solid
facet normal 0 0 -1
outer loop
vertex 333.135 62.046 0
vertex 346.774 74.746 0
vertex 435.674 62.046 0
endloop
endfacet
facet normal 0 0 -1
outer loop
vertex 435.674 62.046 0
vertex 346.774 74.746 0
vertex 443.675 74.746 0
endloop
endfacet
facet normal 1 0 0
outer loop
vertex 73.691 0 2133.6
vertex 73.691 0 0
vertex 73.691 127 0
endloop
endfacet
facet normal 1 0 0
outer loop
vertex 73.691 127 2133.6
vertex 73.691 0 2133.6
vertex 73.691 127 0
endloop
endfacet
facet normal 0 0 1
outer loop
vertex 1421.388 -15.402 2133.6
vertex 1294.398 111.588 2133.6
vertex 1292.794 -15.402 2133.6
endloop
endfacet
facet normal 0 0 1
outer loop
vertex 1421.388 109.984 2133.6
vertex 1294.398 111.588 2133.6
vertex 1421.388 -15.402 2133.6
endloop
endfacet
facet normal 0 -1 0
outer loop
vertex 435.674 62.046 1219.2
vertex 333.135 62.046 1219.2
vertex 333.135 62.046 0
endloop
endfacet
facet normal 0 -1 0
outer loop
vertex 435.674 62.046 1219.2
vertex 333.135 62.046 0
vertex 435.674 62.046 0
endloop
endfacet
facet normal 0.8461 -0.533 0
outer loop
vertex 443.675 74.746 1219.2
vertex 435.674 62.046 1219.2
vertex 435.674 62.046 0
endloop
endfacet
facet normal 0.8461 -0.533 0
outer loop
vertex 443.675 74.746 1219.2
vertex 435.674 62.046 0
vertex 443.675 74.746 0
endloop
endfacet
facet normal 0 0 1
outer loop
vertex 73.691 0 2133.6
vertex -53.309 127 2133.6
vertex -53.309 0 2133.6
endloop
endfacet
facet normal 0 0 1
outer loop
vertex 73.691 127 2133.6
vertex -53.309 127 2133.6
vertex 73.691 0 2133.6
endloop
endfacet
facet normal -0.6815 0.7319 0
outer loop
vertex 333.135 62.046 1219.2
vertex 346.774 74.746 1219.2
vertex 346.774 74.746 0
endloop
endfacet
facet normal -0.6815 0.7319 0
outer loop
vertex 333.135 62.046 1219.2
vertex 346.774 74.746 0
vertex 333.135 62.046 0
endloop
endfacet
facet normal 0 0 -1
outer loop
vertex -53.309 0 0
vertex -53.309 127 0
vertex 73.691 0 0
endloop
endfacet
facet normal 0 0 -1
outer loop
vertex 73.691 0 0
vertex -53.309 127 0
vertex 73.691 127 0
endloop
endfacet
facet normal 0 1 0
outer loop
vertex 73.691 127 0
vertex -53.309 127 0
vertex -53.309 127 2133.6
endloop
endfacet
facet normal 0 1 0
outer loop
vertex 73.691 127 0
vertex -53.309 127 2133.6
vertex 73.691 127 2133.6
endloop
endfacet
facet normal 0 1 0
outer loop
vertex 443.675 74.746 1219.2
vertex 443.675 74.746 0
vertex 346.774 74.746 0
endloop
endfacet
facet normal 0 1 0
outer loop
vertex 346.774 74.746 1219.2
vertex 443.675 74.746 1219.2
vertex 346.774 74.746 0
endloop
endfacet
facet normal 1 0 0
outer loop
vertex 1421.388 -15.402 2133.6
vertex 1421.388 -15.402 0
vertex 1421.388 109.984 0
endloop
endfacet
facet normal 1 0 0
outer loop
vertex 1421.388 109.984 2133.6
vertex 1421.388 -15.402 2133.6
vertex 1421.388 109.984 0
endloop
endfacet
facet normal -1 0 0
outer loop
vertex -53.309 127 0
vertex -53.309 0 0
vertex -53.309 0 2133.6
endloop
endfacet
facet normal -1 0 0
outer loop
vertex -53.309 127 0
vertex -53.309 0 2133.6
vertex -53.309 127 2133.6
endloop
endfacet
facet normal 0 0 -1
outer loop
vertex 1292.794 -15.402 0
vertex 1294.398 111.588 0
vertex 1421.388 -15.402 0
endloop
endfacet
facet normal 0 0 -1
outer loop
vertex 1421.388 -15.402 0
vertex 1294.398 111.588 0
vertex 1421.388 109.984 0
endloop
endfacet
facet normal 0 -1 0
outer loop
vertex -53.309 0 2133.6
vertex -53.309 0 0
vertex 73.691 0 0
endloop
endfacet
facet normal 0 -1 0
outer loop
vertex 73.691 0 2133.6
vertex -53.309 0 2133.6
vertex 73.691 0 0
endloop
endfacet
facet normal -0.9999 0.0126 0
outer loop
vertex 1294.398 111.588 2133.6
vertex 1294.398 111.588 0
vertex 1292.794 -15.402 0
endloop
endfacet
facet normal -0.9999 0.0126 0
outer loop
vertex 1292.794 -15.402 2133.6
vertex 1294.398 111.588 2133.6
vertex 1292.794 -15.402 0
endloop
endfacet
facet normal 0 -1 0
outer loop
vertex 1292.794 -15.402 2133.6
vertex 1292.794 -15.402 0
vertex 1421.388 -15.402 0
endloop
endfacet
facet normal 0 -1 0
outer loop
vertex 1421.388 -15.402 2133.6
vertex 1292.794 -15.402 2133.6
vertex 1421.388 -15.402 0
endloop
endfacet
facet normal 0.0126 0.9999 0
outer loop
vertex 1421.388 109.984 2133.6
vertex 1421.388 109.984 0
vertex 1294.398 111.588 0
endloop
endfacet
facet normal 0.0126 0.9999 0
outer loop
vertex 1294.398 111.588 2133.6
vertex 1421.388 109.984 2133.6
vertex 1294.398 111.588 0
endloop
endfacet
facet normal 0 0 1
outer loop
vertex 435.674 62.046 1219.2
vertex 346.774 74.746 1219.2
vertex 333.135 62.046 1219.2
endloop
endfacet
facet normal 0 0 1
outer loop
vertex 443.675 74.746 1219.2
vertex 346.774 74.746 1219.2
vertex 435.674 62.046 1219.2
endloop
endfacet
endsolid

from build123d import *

# Parameters (mm, degrees)
F0_W     = 127
F0_H     = 127
F1_DEPTH = 2133.6
F3_DEPTH = 1219.2


with BuildPart() as f1:
    # F0 (on Top) → F1 (new body)
    with BuildSketch(Plane.XY):
        with Locations((10.191282, 63.5)):
            Rectangle(F0_W, F0_H)
        Polygon((1294.398367, 111.587874), (1292.793993, -15.401991), (1421.388232, -15.401991), (1421.388232, 109.9835), align=None)
    extrude(amount=F1_DEPTH)


with BuildPart() as f3:
    # F2 (on Top) → F3 (new body)
    with BuildSketch(Plane.XY):
        Polygon((333.135009, 62.046494), (341.136009, 62.046494), (435.673505, 62.046494), (443.674505, 74.746494), (435.673505, 74.746494), (346.773505, 74.746494), align=None)
    extrude(amount=F3_DEPTH)


solid = Compound([f1.part, f3.part])
